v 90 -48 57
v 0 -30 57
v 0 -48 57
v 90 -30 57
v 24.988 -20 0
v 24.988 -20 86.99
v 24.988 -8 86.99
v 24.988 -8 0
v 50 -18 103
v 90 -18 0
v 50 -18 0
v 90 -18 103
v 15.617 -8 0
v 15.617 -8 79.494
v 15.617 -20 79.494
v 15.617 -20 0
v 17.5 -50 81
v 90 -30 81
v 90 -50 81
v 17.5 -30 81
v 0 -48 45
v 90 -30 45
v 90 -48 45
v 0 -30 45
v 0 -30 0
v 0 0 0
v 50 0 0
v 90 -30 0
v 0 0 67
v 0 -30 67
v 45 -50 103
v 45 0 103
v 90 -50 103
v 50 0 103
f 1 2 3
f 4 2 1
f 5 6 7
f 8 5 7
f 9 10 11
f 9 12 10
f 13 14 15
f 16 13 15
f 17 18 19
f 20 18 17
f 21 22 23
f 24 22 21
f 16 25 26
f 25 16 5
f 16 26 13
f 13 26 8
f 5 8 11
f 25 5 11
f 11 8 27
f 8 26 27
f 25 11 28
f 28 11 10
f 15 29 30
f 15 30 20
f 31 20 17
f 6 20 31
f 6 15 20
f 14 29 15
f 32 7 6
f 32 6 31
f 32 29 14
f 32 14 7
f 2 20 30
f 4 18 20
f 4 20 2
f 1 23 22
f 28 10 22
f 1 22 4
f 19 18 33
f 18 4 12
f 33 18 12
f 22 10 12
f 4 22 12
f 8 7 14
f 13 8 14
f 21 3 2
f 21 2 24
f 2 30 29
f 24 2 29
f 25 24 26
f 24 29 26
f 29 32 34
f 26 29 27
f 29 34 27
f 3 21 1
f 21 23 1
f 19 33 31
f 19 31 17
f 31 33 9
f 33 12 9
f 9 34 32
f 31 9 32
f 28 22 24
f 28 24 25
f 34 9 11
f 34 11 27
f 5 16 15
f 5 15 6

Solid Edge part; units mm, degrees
sketch "Sketch1" plane through (0, 0, 0) normal (0, -1, 0) x (1, 0, 0)
  line L0 (90, 45) -> (0, 45)
  line L1 (0, 45) -> (0, 0)
  line L2 (0, 0) -> (90, 0)
  line L3 (90, 0) -> (90, 45)
extrude "Protrusion1" add sketch "Sketch1" along normal blind 30
sketch "Sketch2" plane through (0, 0, 0) normal (0, -1, 0) x (1, 0, 0)
  line L0 (0, 57) -> (90, 57)
  line L1 (90, 57) -> (90, 45)
  line L2 (90, 45) -> (0, 45)
  line L3 (0, 45) -> (0, 57)
extrude "ExtrudedProtrusion_5" add sketch "Sketch2" along normal blind 48
sketch "Sketch3" plane through (0, 0, 0) normal (0, -1, 0) x (1, 0, 0)
  line L0 (90, 81) -> (17.5, 81)
  line L1 (0, 67) -> (17.5, 81)
  line L2 (0, 57) -> (0, 67)
  line L3 (0, 57) -> (90, 57)
  line L4 (90, 67) -> (90, 57)
  line L5 (90, 67) -> (90, 81)
extrude "ExtrudedProtrusion_6" add sketch "Sketch3" along normal blind 30
sketch "Sketch4" plane through (0, 0, 0) normal (0, -1, 0) x (1, 0, 0)
  line L0 (45, 103) -> (17.5, 81)
  line L1 (90, 81) -> (17.5, 81)
  line L2 (90, 81) -> (90, 103)
  line L3 (90, 103) -> (45, 103)
extrude "ExtrudedProtrusion_7" add sketch "Sketch4" along normal blind 50
sketch "Sketch5" plane through (67.5, -25, 103) normal (0, 0, 1) x (1, 0, 0)
  line L0 (22.5, 7) -> (-17.5, 7)
  line L1 (-17.5, 7) -> (-17.5, 25)
  line L2 (-17.5, 25) -> (22.5, 25)
  line L3 (22.5, 25) -> (22.5, 7)
extrude "Cutout1" cut sketch "Sketch5" against normal up to next
sketch "Sketch6" plane through (67.5, -25, 103) normal (0, 0, 1) x (1, 0, 0)
  line L0 (-51.8826, 17) -> (-51.8826, 5)
  line L1 (-51.8826, 5) -> (-42.5122, 5)
  line L2 (-42.5122, 5) -> (-42.5122, 17)
  line L3 (-42.5122, 17) -> (-51.8826, 17)
extrude "Cutout2" cut sketch "Sketch6" against normal up to next
